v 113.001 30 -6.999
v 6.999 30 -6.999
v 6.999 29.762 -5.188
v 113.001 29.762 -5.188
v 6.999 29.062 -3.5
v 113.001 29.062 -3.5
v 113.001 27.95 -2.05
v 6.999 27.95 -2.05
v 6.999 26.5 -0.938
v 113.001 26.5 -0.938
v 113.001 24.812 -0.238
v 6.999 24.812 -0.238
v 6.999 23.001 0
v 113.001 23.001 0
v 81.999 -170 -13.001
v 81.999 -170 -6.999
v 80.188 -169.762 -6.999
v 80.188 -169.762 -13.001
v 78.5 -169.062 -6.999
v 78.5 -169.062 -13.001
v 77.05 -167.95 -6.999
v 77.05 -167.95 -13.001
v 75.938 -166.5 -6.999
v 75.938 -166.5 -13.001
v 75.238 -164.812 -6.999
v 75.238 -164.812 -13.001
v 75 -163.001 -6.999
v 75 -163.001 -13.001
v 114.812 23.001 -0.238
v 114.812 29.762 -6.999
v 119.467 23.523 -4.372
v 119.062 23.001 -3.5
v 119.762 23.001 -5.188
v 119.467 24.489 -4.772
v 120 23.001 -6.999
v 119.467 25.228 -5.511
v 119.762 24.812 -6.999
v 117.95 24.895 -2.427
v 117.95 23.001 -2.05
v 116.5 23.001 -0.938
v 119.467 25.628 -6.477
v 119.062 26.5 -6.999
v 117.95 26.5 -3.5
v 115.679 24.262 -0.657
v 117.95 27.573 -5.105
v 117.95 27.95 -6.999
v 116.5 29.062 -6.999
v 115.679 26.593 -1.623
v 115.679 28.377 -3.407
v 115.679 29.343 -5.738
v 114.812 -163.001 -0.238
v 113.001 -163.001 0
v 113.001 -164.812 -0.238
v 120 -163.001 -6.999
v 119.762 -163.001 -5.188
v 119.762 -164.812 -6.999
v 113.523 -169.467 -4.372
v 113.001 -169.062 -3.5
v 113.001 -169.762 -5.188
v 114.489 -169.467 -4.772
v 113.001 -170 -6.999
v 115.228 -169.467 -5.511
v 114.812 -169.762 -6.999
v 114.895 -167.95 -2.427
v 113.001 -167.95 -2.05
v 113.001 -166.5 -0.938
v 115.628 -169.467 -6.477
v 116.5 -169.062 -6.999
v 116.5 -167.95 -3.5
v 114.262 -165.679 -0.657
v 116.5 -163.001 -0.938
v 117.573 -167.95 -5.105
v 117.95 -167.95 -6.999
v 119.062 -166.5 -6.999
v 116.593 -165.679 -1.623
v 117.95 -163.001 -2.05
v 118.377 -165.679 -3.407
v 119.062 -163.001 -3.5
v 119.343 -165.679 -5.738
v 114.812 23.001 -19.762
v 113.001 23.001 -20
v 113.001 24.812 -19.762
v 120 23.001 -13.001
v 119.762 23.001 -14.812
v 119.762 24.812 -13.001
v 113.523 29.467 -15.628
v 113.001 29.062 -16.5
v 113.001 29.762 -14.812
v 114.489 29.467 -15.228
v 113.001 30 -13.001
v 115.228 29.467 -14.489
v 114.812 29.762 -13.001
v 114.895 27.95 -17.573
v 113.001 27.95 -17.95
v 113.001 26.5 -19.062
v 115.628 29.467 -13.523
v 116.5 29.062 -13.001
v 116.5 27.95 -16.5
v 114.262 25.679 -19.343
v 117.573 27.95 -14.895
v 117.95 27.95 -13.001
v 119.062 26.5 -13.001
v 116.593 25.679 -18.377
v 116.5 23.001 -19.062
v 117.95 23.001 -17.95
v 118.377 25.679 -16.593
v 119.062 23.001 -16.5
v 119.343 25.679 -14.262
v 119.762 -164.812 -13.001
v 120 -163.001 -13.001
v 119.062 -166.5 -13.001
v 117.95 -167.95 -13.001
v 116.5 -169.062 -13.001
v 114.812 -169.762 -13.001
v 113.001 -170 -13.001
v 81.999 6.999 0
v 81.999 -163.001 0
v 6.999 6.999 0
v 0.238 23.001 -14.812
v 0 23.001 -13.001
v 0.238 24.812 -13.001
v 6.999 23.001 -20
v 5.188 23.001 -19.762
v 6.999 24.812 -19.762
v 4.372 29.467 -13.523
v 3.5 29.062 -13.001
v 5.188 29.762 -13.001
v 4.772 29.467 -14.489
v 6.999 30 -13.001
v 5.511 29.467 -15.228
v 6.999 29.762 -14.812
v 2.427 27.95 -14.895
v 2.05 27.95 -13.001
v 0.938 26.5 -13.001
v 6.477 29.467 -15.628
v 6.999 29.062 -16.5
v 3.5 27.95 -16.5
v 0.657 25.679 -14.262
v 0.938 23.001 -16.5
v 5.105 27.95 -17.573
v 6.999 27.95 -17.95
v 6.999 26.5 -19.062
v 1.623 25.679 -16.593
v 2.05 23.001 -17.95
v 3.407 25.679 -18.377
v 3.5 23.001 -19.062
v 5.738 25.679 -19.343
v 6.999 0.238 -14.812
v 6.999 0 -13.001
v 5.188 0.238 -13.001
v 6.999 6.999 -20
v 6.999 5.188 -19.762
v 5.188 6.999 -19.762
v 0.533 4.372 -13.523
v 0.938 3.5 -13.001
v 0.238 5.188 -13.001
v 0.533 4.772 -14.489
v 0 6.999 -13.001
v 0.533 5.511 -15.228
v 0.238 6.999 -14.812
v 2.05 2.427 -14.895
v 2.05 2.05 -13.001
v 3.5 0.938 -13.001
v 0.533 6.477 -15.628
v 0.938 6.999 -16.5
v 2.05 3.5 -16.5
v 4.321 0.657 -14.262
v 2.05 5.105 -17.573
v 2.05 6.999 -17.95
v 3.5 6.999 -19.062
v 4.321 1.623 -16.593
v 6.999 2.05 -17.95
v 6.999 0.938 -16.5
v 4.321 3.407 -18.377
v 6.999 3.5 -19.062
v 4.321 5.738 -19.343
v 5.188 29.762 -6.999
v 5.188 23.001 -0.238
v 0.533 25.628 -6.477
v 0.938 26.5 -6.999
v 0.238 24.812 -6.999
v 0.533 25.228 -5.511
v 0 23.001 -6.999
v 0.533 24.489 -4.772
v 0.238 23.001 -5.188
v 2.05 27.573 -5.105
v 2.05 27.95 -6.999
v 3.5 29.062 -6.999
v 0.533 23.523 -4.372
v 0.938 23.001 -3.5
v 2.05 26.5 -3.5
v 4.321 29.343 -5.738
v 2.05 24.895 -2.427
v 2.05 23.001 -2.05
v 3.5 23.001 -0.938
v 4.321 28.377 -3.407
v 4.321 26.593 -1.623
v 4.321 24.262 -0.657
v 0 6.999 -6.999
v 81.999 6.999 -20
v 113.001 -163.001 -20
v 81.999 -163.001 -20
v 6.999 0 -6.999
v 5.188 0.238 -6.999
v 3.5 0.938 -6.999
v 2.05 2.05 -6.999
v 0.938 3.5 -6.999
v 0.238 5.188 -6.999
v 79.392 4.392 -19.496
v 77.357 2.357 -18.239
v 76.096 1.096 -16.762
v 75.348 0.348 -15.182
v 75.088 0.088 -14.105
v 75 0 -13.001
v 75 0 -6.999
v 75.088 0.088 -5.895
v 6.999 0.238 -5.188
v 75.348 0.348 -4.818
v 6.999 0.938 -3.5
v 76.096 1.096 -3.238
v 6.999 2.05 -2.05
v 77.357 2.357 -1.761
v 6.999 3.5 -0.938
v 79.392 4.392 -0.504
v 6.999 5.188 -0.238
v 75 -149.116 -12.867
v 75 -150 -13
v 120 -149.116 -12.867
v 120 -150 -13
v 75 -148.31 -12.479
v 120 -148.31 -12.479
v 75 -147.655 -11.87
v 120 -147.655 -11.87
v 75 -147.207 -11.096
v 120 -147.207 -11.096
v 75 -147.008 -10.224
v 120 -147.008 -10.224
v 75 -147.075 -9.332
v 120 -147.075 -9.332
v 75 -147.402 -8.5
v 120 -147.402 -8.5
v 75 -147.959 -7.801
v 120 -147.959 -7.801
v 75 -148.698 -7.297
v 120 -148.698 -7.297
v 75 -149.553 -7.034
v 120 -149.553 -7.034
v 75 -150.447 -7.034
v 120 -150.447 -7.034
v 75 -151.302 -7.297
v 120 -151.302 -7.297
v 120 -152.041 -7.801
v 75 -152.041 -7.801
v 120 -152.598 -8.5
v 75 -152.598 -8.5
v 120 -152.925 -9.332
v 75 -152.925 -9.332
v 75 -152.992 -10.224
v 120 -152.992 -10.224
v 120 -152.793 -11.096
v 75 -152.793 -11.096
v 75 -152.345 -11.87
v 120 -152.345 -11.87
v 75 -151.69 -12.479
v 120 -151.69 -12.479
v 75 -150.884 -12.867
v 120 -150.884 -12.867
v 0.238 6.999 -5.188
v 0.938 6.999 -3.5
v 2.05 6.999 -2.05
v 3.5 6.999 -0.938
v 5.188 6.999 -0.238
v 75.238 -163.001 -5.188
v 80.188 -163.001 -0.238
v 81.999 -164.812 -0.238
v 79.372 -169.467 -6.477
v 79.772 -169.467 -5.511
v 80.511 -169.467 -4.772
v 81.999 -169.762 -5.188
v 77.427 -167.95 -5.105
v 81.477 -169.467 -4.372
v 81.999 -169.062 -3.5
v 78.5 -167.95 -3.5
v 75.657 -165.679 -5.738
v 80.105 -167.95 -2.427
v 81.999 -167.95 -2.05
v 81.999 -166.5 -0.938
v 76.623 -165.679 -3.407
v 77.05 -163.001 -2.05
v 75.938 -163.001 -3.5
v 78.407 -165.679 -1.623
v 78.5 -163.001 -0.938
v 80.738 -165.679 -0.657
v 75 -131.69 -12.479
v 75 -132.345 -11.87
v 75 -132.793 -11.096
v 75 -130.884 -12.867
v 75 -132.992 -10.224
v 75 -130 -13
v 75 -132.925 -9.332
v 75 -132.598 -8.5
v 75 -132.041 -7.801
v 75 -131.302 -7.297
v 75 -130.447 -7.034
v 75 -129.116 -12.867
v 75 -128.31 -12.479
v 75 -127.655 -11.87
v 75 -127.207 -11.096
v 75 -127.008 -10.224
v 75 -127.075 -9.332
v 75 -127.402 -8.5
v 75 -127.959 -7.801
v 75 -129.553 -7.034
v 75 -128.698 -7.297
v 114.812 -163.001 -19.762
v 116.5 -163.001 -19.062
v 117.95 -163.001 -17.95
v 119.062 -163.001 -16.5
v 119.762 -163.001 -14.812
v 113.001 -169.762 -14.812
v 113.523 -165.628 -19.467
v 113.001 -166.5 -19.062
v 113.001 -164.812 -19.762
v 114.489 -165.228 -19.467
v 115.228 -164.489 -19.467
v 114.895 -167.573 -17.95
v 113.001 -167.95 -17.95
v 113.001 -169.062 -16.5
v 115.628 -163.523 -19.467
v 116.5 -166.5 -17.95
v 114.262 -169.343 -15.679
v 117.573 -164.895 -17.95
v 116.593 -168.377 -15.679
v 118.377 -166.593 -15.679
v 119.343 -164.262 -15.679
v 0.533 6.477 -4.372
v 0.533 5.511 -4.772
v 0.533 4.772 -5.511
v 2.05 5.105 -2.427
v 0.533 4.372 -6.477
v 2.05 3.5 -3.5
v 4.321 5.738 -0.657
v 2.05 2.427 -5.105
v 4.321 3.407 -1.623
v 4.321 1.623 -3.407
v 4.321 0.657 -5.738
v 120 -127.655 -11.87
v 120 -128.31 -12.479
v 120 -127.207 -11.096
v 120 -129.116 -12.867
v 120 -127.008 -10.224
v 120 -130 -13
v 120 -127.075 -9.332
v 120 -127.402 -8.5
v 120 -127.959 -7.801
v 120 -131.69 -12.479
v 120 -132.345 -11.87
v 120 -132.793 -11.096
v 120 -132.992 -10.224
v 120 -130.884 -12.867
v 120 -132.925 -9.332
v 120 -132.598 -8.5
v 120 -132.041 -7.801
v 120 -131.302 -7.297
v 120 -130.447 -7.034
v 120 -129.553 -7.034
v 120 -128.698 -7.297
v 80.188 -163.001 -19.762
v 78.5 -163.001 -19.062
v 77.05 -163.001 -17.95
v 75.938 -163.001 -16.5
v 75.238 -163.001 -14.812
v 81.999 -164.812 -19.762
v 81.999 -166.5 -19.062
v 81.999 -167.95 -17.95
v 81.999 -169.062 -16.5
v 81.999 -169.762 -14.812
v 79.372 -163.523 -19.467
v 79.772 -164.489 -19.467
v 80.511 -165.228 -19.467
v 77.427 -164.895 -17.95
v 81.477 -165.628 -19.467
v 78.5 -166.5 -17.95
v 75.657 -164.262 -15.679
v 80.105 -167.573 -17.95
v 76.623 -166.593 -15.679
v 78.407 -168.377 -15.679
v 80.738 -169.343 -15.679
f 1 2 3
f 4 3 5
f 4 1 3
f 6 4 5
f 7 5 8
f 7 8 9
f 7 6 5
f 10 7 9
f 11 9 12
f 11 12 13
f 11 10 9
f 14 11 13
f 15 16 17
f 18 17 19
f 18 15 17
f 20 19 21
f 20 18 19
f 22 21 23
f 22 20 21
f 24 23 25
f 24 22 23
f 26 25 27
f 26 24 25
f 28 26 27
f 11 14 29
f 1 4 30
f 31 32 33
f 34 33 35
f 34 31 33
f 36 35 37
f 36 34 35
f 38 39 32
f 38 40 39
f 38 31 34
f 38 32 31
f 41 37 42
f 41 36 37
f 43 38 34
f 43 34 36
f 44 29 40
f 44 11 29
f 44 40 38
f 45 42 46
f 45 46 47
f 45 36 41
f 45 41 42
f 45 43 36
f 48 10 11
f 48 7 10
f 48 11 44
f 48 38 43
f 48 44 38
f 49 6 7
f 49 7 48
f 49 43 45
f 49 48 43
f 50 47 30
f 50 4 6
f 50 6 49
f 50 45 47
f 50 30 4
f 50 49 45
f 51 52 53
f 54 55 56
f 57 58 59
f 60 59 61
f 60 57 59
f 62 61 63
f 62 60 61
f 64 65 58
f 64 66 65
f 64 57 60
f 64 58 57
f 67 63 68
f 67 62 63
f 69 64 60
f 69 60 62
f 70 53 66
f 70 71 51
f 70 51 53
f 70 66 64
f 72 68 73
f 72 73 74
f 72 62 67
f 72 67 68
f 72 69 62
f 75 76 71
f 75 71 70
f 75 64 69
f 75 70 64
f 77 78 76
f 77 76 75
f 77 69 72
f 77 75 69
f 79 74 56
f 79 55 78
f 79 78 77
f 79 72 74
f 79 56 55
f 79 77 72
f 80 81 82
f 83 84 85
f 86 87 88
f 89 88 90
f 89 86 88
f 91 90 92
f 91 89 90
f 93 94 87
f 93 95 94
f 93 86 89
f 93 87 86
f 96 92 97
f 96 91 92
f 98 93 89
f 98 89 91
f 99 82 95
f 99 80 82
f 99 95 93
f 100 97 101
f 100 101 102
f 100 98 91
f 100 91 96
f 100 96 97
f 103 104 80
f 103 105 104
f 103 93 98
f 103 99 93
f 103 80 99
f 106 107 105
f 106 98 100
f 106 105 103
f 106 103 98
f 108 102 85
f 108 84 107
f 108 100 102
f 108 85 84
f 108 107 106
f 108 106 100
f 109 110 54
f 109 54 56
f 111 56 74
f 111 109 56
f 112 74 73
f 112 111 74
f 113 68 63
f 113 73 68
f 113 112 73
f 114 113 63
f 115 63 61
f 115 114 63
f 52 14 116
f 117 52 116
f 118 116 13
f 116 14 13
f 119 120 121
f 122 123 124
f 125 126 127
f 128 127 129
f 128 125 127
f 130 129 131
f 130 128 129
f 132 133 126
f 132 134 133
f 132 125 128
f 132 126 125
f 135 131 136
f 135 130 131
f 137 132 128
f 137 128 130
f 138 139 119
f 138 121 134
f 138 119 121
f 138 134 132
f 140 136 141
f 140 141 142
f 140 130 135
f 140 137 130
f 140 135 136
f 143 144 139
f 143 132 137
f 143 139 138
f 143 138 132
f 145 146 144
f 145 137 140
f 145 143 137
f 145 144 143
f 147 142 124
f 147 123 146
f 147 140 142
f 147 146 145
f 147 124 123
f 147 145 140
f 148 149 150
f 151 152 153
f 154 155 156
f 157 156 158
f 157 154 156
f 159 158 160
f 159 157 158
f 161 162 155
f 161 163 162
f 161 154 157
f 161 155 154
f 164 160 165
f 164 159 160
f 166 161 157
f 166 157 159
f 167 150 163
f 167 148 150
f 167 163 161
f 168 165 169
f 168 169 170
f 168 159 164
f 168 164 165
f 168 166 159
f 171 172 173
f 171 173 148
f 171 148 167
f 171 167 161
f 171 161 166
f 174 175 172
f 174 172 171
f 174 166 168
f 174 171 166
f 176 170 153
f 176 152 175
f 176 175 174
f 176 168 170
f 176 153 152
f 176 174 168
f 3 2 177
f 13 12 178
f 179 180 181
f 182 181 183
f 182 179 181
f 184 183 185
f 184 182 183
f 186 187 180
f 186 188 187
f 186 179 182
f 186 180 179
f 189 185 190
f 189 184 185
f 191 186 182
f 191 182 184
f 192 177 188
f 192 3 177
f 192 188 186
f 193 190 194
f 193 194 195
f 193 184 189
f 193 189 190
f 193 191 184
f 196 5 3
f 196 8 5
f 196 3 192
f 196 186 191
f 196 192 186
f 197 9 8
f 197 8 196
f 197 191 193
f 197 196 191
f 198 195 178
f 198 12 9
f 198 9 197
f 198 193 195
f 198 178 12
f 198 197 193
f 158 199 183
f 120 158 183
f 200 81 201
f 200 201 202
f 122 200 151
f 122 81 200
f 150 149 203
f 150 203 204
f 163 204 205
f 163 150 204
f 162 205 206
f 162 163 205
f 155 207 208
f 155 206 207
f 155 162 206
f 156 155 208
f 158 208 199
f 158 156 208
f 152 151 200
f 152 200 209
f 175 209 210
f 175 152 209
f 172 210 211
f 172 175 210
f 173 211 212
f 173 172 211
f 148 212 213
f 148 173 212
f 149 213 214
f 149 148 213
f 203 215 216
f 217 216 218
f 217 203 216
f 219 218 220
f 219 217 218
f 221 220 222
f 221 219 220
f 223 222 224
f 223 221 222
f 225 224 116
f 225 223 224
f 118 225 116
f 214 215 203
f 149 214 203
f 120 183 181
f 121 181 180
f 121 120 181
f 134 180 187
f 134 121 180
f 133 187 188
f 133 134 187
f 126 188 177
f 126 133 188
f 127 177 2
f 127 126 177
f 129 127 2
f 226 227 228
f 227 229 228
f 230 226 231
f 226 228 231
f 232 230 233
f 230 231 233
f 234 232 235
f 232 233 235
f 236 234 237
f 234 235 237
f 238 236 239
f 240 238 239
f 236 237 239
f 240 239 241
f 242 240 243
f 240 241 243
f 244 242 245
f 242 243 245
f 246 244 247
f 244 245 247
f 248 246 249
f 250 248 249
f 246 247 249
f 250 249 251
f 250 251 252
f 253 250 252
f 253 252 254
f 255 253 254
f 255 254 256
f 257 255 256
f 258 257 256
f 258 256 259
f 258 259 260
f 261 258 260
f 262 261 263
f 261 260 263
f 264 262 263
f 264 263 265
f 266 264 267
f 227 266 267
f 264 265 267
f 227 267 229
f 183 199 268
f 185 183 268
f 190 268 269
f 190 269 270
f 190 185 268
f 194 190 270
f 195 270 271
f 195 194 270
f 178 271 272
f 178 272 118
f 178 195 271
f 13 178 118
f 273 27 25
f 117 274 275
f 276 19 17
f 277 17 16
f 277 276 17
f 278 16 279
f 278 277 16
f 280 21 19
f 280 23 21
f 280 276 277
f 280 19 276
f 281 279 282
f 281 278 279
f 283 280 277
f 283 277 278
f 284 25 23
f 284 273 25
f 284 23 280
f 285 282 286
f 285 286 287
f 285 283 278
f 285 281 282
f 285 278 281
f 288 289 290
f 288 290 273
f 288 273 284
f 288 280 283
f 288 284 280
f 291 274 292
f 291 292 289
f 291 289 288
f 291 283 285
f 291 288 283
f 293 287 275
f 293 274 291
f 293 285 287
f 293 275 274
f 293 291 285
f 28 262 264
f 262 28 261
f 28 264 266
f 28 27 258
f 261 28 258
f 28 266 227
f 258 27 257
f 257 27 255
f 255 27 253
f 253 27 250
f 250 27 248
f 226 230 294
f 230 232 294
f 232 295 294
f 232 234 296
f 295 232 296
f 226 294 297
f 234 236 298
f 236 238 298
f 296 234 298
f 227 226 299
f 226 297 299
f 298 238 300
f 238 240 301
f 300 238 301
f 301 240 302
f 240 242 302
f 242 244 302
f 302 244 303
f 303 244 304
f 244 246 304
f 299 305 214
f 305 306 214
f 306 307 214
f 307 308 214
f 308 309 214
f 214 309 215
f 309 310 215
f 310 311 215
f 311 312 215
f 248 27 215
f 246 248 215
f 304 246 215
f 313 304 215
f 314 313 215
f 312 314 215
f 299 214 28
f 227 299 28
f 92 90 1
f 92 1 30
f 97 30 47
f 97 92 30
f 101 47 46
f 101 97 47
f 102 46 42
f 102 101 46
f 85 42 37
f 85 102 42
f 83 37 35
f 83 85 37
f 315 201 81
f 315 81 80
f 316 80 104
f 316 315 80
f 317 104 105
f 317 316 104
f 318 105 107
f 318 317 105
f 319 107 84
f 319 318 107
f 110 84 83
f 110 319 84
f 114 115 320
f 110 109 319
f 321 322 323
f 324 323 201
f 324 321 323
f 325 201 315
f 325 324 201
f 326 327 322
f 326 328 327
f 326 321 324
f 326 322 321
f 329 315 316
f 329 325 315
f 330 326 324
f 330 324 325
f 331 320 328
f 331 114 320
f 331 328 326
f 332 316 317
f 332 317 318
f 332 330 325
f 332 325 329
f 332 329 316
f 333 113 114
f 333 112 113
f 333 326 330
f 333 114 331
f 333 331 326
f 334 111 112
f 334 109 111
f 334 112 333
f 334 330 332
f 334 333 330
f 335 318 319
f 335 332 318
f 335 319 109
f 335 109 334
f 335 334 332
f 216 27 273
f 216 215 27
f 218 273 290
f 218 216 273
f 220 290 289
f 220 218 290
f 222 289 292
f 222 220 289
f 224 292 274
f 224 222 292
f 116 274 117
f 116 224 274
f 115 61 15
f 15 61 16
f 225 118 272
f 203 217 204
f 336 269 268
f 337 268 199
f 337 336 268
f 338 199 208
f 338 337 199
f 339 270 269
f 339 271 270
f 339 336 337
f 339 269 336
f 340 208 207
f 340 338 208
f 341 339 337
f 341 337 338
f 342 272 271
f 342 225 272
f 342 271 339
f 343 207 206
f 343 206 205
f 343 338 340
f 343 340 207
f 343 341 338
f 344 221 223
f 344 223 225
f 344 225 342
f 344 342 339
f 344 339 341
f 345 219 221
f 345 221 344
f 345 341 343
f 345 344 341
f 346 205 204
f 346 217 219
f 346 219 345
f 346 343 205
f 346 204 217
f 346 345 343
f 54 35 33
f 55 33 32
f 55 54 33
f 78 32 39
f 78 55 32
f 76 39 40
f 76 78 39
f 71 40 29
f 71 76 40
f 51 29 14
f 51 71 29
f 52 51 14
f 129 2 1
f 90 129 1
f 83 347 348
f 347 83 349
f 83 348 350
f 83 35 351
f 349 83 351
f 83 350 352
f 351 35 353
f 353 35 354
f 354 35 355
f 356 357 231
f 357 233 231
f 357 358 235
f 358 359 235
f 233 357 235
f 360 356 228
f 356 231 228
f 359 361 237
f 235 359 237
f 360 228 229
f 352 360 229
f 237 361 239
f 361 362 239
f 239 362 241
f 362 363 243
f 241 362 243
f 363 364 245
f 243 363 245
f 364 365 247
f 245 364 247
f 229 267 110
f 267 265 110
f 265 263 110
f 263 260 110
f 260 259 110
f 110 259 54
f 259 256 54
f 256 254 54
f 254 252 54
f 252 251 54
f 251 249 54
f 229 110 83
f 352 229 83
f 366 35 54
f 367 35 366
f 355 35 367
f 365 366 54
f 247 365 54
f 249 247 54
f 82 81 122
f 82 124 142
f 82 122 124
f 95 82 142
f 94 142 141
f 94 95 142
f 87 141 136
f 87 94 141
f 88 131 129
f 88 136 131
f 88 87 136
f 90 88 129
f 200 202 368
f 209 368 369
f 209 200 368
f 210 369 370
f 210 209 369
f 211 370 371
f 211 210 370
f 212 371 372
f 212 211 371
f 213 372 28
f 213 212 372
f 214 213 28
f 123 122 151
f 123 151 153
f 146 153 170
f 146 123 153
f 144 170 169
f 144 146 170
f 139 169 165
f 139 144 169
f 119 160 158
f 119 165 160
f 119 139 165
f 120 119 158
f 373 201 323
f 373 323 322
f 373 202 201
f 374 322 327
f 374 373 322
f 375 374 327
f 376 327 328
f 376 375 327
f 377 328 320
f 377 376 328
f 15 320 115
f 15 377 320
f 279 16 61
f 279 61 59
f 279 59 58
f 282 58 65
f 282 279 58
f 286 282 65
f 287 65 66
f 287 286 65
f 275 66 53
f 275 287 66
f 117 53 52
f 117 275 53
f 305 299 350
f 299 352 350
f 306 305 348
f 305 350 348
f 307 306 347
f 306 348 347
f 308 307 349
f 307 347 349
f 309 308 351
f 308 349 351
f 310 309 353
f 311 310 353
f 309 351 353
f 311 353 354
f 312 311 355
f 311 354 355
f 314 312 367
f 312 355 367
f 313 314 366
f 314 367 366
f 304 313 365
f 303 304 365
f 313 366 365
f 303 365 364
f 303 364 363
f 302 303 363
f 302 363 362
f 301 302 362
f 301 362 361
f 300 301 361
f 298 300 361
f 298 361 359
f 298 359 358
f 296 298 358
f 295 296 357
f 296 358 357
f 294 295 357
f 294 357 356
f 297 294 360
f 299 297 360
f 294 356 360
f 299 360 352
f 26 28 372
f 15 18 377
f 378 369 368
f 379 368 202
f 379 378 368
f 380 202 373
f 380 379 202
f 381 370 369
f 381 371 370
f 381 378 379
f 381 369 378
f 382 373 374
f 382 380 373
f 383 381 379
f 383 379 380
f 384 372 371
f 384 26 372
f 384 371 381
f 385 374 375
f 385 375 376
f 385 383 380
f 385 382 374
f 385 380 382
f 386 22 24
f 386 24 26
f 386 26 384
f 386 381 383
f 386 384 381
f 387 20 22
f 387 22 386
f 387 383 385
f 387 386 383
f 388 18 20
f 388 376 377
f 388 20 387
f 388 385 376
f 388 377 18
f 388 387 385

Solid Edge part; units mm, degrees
sketch "Sketch1" plane through (0, 0, 0) normal (0, 0, 1) x (1, 0, 0)
  line L0 (0, 30) -> (120, 30)
  line L1 (120, 30) -> (120, -170)
  line L2 (120, -170) -> (75, -170)
  line L3 (75, -170) -> (75, 0)
  line L4 (75, 0) -> (0, 0)
  line L5 (0, 0) -> (0, 30)
  dimension "D1" = 30
  dimension "D2" = 200
  dimension "D3" = 45
  dimension "D4" = 120
extrude "Protrusion1" add sketch "Sketch1" against normal blind 20
hole "Hole1" at (120, -150, -10) direction (-1, 0, 0) diameter 6 end up to next
hole "Hole2" at (120, -130, -10) direction (-1, 0, 0) diameter 6 end up to next
fillet "Avrundning" radius 7 17 edges at (60, 30, 0) (120, -70, 0) (75, -85, 0) (37.5, 0, 0) (97.5, -170, 0) (75, -170, -10) (120, -170, -10) (97.5, -170, -20) (75, -85, -20) (120, -70, -20) (37.5, 0, -20) (0, 15, -20) (0, 0, -10) (0, 30, -10) (0, 15, 0) (60, 30, -20) (120, 30, -10)
properties material "Aluminum, 1060"
